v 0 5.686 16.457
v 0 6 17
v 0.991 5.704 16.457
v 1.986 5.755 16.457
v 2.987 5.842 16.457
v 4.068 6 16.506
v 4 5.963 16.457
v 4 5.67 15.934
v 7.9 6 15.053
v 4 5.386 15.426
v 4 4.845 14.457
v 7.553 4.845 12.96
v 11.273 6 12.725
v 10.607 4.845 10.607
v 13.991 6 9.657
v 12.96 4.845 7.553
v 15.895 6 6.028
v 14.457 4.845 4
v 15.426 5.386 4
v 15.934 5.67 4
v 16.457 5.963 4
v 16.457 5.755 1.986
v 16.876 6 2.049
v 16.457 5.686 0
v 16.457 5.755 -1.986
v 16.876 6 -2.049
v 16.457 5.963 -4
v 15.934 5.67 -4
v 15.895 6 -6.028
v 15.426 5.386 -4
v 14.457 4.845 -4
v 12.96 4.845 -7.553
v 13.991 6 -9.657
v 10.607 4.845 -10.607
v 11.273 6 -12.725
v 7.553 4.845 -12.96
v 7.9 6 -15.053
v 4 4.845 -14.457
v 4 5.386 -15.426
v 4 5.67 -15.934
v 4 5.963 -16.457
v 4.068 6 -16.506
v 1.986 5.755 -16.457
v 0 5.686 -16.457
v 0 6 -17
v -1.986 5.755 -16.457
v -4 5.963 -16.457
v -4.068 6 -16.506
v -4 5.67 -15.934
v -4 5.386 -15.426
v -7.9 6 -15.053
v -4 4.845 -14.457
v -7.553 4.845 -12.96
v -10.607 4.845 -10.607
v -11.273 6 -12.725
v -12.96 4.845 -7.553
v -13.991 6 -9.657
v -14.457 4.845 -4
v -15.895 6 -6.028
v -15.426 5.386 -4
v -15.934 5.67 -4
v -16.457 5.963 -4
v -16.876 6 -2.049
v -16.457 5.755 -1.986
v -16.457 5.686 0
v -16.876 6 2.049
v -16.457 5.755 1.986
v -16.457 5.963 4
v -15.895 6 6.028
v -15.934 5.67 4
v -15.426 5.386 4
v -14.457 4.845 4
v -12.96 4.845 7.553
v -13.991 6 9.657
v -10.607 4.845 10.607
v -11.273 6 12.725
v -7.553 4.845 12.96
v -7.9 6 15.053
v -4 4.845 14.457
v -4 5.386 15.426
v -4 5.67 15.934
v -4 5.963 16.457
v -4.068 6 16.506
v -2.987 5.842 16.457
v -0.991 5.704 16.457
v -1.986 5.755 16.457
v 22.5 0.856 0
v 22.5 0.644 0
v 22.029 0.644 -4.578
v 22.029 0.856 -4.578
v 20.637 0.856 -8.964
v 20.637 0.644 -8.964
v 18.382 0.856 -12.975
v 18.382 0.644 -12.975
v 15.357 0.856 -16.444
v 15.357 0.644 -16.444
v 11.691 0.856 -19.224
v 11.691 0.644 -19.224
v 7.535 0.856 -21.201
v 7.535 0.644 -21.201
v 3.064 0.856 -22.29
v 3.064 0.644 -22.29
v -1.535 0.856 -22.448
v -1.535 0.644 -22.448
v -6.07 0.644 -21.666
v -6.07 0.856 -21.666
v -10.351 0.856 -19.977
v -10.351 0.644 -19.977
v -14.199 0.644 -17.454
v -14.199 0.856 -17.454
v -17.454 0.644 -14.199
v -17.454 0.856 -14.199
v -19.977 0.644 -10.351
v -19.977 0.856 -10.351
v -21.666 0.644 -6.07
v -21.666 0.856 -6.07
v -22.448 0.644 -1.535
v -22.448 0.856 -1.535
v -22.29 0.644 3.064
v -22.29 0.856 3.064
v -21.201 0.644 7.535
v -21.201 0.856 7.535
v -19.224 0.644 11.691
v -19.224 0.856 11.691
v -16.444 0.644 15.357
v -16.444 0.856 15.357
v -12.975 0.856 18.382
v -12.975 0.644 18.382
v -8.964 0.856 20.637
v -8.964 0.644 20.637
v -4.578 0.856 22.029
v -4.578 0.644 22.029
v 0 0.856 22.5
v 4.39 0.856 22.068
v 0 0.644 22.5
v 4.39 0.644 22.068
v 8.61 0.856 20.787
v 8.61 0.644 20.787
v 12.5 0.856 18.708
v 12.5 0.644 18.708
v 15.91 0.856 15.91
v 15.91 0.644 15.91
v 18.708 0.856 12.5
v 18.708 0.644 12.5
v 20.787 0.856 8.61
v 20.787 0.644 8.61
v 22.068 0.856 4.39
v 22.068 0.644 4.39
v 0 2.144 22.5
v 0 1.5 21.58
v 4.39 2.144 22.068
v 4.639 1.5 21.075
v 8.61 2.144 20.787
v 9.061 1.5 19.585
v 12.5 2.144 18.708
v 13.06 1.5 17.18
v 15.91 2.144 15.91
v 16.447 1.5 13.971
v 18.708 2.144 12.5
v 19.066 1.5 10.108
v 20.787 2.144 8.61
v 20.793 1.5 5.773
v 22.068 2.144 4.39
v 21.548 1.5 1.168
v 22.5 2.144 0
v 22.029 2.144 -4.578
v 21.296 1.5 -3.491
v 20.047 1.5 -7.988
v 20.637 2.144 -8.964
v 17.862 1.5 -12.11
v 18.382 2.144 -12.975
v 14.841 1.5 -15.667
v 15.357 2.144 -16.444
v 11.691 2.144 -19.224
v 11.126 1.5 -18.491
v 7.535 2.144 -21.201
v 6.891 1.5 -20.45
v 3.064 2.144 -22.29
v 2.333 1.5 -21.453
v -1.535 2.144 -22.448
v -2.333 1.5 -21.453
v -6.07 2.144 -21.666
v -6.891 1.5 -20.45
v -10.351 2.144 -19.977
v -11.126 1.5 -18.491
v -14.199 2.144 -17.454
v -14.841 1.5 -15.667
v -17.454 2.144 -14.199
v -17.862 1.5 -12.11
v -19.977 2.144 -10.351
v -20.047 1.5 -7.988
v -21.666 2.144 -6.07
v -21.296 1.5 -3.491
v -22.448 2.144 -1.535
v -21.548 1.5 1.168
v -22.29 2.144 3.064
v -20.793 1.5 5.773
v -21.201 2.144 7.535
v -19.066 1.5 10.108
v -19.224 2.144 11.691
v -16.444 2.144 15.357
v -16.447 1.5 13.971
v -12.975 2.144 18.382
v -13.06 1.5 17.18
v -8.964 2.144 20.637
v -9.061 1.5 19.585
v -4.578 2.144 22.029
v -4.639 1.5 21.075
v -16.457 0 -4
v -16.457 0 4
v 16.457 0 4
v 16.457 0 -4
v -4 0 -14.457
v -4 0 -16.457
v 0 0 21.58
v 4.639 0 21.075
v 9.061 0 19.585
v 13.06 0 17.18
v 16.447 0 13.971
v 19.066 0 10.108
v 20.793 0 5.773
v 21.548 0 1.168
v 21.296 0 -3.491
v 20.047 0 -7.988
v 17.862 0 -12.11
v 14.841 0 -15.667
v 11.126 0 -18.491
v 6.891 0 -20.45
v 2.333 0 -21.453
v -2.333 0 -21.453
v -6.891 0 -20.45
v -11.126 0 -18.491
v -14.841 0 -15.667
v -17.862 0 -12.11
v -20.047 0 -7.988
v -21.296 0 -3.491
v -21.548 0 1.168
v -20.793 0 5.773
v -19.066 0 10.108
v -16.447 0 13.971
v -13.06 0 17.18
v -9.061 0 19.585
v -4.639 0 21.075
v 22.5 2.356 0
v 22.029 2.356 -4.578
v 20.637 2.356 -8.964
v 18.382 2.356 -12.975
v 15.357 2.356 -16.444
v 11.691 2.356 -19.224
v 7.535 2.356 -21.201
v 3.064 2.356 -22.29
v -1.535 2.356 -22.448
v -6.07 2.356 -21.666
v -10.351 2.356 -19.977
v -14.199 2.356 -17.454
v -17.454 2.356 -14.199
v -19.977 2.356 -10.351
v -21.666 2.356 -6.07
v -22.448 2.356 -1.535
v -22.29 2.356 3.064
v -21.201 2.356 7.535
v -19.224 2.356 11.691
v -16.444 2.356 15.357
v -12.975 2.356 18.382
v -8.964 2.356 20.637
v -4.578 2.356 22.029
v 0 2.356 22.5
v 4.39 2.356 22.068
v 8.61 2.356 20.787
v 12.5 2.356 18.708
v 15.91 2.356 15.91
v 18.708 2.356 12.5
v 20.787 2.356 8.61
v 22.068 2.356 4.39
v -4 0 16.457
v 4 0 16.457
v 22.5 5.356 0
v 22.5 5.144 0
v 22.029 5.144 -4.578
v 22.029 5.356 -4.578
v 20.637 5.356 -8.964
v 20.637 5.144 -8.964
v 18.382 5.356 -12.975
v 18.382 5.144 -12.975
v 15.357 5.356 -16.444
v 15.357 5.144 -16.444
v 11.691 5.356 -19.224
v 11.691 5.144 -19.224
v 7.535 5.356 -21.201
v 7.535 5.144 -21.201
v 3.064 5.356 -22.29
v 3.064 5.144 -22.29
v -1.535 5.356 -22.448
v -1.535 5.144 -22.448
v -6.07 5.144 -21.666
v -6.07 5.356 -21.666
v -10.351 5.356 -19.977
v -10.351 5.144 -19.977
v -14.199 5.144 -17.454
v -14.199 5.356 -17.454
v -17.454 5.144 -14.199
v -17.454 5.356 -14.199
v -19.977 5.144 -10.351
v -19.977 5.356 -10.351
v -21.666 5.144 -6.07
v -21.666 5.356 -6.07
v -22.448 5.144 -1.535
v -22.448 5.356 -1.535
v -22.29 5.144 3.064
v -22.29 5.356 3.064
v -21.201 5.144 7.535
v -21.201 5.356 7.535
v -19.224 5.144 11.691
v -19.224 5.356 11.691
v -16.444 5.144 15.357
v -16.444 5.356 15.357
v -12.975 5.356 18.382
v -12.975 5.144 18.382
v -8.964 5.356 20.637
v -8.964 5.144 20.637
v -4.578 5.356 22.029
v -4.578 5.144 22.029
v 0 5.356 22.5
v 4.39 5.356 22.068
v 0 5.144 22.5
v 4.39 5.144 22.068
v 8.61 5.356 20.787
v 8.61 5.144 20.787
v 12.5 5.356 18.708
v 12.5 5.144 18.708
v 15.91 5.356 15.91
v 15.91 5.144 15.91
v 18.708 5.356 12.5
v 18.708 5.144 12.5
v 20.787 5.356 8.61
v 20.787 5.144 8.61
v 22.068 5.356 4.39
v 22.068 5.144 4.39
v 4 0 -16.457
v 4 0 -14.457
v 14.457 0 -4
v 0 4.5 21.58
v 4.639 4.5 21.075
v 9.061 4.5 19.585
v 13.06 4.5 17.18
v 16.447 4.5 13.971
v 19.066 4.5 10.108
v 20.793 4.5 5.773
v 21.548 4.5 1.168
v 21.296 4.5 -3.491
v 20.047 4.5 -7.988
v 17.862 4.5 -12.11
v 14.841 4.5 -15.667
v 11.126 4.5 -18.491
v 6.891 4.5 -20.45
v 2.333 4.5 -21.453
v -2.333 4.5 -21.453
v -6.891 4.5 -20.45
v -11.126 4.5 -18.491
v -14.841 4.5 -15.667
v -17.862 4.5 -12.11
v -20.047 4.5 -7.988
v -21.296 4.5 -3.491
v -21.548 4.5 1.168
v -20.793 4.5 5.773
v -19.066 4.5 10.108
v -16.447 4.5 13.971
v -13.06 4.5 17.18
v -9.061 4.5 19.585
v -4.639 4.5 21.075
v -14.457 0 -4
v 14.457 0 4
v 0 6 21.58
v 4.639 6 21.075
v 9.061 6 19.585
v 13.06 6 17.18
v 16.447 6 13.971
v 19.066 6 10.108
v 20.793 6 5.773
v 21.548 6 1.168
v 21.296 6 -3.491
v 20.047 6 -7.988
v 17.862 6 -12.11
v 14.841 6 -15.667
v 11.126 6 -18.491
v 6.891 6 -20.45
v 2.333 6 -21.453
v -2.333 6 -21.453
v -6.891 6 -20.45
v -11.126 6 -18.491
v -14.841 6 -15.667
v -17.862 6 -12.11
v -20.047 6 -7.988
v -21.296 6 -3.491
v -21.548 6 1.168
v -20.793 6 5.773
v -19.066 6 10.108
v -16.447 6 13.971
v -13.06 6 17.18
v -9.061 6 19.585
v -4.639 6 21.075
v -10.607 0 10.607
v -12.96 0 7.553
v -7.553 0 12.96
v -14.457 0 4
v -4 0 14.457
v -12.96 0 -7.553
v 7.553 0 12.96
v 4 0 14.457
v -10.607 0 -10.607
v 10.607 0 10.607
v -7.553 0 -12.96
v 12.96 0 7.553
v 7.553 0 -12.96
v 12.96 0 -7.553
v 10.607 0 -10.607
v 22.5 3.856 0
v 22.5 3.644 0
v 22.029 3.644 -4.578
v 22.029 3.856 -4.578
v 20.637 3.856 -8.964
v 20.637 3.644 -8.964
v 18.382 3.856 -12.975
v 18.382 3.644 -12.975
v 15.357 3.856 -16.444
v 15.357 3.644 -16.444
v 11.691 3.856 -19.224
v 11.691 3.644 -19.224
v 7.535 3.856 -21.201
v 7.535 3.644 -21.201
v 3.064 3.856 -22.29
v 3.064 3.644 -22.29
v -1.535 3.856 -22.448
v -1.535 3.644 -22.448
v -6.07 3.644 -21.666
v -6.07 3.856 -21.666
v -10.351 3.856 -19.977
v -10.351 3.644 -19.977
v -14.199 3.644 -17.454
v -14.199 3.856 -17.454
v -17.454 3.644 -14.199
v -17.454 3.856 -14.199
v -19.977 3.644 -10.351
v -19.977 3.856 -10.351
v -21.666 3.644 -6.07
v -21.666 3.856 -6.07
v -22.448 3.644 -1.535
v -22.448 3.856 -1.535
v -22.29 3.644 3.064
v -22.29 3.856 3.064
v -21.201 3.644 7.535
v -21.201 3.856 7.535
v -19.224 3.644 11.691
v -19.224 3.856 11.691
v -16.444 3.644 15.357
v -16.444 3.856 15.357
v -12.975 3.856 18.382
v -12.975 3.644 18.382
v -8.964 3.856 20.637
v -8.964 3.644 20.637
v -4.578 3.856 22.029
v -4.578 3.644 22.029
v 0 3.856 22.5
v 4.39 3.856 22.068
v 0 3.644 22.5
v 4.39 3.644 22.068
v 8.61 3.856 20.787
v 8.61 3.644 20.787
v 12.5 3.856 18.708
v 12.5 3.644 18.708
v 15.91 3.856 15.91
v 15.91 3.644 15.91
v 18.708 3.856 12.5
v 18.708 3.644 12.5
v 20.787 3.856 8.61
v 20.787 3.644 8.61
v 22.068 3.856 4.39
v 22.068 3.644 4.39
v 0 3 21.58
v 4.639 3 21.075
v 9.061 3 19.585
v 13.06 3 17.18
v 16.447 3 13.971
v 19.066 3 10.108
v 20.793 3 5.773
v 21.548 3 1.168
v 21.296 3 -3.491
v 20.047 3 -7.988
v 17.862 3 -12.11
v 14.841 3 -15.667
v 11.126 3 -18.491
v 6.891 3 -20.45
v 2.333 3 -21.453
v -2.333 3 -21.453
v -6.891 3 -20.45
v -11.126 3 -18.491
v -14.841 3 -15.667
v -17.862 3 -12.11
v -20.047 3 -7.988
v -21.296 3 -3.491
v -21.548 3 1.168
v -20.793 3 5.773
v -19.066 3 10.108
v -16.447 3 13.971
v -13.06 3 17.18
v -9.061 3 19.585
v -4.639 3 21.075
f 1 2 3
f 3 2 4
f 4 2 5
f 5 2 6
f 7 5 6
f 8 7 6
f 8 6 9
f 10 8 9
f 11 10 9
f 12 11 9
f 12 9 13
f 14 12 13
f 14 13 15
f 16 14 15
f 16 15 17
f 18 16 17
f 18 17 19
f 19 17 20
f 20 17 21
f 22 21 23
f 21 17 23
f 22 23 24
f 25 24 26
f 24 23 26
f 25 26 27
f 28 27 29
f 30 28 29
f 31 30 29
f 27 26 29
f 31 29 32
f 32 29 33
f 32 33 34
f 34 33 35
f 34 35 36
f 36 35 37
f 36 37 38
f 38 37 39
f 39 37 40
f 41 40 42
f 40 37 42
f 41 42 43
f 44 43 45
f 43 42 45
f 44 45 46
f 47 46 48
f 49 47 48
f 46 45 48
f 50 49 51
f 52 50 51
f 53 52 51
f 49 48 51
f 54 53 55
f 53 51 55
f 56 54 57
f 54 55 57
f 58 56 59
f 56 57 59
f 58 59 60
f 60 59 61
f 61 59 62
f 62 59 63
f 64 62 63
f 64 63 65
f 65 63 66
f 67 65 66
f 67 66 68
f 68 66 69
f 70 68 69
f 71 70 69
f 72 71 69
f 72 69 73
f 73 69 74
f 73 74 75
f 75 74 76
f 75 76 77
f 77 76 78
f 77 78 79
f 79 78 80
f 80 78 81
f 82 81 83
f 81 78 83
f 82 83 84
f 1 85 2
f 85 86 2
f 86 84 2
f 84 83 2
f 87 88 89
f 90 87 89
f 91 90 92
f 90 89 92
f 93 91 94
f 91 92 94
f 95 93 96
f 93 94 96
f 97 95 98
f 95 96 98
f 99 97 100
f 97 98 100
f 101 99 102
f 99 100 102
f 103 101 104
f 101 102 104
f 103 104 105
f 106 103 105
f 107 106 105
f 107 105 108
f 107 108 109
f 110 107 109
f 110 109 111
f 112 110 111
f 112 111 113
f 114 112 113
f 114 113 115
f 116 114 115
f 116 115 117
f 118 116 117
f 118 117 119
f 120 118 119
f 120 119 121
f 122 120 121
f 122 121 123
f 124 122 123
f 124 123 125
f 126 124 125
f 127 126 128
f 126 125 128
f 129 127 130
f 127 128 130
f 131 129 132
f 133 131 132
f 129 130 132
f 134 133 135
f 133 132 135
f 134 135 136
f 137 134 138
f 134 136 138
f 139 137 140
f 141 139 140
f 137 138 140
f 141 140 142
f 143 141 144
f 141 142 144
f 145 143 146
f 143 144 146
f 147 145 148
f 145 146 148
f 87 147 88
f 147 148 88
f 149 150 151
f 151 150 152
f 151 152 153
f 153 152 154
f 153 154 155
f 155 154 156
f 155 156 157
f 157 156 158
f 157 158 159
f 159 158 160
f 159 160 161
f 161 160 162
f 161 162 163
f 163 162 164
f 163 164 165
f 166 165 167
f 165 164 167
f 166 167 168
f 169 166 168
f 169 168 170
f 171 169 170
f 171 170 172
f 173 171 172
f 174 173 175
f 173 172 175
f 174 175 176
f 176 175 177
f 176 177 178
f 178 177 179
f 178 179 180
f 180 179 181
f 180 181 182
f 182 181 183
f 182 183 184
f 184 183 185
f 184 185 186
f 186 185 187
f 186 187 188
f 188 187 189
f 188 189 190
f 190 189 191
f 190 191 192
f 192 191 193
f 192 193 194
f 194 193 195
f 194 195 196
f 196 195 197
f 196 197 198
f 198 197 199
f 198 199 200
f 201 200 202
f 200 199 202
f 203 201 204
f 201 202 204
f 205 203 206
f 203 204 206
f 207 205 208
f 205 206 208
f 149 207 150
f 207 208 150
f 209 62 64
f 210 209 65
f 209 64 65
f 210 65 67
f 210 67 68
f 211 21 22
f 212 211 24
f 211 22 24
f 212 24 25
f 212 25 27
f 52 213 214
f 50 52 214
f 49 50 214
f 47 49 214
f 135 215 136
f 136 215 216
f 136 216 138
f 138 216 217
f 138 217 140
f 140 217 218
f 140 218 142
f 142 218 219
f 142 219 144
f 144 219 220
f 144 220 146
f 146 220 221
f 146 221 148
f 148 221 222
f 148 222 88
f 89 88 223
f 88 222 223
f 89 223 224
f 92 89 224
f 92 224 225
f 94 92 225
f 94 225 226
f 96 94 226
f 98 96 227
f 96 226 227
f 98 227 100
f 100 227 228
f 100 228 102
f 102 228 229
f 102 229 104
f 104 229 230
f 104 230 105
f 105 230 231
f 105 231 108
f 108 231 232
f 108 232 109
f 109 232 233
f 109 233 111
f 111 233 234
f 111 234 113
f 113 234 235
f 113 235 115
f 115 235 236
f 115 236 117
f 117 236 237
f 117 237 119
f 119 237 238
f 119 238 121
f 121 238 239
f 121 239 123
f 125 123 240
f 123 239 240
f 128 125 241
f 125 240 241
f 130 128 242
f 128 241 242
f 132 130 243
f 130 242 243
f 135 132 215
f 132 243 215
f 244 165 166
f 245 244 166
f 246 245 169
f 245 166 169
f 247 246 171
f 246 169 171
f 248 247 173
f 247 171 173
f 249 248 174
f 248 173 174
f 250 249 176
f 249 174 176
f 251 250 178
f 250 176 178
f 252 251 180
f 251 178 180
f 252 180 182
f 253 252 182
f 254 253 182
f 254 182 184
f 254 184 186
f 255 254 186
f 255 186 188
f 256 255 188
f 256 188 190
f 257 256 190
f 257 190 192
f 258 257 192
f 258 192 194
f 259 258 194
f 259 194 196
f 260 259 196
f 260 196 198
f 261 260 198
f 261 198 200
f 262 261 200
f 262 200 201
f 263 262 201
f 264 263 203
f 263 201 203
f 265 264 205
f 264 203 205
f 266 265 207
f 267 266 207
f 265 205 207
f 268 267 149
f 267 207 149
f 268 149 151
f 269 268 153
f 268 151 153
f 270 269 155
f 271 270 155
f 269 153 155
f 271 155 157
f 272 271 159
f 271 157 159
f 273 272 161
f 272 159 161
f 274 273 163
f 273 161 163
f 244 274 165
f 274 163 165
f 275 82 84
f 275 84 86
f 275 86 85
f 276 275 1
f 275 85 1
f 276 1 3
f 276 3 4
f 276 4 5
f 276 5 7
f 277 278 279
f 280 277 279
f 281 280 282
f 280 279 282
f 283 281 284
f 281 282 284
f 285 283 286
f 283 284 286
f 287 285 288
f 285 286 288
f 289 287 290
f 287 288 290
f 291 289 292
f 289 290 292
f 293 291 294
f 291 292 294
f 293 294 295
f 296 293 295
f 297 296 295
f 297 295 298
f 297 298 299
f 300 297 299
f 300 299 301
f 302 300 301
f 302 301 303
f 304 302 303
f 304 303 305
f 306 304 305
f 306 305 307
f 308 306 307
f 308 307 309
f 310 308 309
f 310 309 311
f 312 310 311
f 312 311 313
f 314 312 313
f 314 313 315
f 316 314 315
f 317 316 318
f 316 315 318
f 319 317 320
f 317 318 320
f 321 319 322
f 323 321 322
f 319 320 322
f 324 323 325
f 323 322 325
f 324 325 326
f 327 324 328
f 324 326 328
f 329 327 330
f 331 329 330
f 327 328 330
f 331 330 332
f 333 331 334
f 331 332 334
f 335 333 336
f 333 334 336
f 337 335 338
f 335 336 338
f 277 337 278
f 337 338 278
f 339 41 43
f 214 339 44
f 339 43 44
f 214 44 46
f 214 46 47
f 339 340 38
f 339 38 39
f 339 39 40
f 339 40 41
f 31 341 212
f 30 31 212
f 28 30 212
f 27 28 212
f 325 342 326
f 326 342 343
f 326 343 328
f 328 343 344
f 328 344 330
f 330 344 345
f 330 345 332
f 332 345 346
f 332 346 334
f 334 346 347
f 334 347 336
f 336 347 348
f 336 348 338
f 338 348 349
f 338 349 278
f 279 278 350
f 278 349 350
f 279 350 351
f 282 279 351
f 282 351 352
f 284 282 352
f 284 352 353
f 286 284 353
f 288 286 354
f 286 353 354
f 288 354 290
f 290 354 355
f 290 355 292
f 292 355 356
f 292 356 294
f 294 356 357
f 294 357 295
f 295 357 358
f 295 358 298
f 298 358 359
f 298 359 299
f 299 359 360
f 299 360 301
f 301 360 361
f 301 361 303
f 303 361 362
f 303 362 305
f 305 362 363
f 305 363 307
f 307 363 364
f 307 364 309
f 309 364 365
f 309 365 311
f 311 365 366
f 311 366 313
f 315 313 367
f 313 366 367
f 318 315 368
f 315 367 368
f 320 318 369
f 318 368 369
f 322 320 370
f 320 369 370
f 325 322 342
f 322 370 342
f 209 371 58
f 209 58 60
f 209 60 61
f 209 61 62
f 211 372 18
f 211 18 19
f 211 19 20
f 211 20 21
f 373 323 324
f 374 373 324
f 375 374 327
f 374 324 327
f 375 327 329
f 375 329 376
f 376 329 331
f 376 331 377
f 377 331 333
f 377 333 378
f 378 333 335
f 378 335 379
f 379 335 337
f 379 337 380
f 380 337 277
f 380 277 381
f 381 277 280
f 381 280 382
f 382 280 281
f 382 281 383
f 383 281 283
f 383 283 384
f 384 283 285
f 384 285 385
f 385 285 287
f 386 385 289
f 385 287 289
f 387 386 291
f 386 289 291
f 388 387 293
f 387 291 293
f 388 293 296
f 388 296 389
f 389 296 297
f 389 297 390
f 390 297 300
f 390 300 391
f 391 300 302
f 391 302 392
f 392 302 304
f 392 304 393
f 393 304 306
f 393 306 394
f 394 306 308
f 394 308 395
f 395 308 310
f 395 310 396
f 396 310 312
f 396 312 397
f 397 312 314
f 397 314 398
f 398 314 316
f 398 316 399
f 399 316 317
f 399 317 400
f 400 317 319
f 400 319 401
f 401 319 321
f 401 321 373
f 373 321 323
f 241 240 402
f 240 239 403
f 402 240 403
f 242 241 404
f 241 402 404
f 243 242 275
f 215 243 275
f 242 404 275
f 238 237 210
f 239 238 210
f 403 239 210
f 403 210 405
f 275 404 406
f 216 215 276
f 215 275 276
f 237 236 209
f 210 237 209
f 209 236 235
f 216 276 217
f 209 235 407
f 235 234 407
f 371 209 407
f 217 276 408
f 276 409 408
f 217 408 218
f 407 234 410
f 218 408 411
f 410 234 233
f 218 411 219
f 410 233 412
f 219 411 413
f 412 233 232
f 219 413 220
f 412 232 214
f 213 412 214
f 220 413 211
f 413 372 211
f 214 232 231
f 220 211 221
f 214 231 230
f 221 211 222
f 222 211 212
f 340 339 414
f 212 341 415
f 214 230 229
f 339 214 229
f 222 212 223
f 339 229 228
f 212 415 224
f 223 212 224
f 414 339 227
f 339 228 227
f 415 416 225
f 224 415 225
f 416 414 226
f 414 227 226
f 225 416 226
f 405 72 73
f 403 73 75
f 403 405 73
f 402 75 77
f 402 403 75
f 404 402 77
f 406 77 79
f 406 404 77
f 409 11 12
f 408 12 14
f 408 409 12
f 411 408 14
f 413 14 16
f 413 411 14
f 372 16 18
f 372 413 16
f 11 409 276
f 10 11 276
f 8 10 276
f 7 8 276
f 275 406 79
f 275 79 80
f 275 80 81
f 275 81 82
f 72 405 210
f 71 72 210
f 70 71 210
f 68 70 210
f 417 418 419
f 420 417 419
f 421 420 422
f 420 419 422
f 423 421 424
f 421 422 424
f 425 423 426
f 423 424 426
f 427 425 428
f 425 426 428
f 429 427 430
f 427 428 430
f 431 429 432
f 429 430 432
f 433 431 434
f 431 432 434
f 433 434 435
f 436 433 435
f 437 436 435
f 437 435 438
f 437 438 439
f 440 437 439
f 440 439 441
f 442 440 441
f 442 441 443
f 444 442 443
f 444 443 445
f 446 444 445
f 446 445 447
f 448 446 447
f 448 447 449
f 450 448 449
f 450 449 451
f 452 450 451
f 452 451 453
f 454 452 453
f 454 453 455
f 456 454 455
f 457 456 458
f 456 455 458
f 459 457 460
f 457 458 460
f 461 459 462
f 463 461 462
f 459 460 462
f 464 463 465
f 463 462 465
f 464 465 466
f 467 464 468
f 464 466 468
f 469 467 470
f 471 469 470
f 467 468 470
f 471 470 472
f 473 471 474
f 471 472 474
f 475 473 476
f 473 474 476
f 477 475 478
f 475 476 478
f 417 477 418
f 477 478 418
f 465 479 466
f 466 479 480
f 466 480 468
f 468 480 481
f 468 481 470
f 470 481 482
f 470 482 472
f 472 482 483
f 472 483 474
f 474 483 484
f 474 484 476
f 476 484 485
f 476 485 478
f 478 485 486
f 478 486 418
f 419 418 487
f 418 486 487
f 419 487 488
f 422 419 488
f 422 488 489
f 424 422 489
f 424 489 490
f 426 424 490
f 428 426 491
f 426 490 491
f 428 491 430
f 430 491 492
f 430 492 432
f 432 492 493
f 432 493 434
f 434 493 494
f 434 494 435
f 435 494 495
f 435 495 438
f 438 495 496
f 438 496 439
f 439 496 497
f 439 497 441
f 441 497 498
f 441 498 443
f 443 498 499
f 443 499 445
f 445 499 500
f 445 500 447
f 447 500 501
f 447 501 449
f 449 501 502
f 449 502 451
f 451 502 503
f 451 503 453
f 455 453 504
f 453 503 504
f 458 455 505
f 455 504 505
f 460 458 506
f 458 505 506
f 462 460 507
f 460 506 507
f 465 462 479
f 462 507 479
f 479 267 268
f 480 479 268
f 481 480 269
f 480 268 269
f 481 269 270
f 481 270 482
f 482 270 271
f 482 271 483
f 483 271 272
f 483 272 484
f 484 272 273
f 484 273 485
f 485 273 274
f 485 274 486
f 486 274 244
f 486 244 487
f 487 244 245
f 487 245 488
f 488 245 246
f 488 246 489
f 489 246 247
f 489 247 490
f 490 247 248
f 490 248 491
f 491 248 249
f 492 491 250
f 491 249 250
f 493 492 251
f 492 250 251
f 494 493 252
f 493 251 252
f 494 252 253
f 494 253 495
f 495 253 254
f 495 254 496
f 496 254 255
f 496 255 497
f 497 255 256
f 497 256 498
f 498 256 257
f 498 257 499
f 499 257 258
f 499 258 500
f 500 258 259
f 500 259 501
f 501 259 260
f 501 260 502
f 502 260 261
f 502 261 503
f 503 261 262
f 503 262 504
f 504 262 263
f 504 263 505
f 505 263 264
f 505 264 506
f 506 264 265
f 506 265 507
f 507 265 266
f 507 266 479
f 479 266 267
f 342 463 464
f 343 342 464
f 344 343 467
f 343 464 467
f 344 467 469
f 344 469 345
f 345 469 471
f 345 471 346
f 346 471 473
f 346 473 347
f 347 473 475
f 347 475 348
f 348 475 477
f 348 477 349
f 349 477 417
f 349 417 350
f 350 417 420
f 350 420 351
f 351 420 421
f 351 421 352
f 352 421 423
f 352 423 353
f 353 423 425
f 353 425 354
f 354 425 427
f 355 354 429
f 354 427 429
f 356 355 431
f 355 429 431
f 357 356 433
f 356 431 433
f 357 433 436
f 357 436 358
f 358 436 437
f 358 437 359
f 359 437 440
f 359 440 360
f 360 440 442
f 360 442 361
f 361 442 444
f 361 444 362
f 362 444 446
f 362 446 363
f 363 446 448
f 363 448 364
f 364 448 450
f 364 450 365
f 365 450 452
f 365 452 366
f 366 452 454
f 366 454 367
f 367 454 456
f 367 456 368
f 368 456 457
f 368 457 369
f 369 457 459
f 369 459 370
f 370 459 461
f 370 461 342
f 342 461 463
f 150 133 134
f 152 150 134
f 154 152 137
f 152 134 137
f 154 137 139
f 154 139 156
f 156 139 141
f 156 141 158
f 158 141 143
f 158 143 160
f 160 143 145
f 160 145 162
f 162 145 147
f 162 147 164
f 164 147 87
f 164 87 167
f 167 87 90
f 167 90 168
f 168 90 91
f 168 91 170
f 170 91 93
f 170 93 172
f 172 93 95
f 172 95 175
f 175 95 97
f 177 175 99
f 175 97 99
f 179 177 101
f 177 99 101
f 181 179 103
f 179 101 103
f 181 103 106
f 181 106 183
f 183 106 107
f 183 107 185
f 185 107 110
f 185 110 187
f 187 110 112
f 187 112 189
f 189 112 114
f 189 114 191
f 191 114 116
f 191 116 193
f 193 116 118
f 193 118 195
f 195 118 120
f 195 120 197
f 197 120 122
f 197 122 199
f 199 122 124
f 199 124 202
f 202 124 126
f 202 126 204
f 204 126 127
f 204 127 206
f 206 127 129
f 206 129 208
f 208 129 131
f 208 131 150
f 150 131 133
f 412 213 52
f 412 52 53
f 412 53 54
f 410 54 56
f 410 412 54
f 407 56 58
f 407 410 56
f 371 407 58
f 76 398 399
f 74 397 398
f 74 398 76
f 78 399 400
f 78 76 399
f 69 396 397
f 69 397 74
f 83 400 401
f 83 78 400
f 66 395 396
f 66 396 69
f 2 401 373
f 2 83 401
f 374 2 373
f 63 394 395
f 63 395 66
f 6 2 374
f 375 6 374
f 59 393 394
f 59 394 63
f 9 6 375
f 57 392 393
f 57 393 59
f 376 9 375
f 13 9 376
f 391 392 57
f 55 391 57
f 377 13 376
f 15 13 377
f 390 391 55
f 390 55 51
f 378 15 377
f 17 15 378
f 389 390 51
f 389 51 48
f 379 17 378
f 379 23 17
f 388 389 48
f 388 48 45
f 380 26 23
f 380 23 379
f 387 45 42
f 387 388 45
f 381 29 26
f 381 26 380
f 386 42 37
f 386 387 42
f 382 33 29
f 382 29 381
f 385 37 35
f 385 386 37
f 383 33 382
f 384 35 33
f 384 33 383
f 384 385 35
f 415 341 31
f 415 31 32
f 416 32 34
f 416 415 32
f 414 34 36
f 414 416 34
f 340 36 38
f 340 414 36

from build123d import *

# Parameters (mm, degrees)
SKETCH_1_R                    = 22.5
SKETCH_1_R_2                  = 15
EXTRUDE_1_DEPTH               = 6
PATTERN_LINEAR_45_1_5_1_COUNT = 5
PATTERN_LINEAR_45_1_5_1_PITCH = 1.5
SKETCH_4_W                    = 2
SKETCH_4_H                    = 8
CUT_EXTRUDE_2_DEPTH           = 7
PATTERN_CIRCULAR_1_COUNT      = 4


with BuildPart() as part:
    # Эскиз1 → Вытянуть1 (new body)
    with BuildSketch(Plane(origin=(0, 0, 0), x_dir=(1, 0, 0), z_dir=(0, 1, 0))):
        Circle(SKETCH_1_R)
        Circle(SKETCH_1_R_2, mode=Mode.SUBTRACT)
    extrude(amount=EXTRUDE_1_DEPTH)

    # Эскиз2 → М45х1,5 1й зуб (revolve, cut)
    with BuildSketch(Plane(origin=(0, 0, 0), x_dir=(0, 0, -1), z_dir=(1, 0, 0))):
        Polygon((-21.58, 6), (-22.5, 5.355809065), (-25, 5.355809065), (-25, 6.644190935), (-22.5, 6.644190935), align=None)
    cut_revolve_45_1_5_1 = revolve(axis=Axis((0, 0, 0), (0, 1, 0)), mode=Mode.SUBTRACT)

    # Эскиз3 → Вырез-Повернуть2 (revolve, cut)
    with BuildSketch(Plane(origin=(0, 0, 0), x_dir=(0, 0, -1), z_dir=(1, 0, 0))):
        Polygon((-15, 4.845299462), (-17, 6), (-15, 6), align=None)
    revolve(axis=Axis((0, 0, 0), (0, 1, 0)), mode=Mode.SUBTRACT)

    # М45х1,5 массив1: М45х1,5 1й зуб ×5
    with Locations(*[(0, -i * PATTERN_LINEAR_45_1_5_1_PITCH, 0) for i in range(1, PATTERN_LINEAR_45_1_5_1_COUNT)]):
        add(cut_revolve_45_1_5_1, mode=Mode.SUBTRACT)

    # Эскиз4 → Вытянуть2 (cut, through all)
    with BuildSketch(Plane(origin=(0, 6, 0), x_dir=(1, 0, 0), z_dir=(0, 1, 0))):
        with Locations((15.456832295, 0)):
            Rectangle(SKETCH_4_W, SKETCH_4_H)
    cut_extrude_2 = extrude(amount=-CUT_EXTRUDE_2_DEPTH, mode=Mode.SUBTRACT)

    # Круговой массив1: Вытянуть2 ×4 about axis
    pattern_circular_1_axis = Axis((0, 0, 0), (0, 1, 0))
    for i in range(1, PATTERN_CIRCULAR_1_COUNT):
        add(cut_extrude_2.rotate(pattern_circular_1_axis, i * 360 / PATTERN_CIRCULAR_1_COUNT), mode=Mode.SUBTRACT)


solid = part.part
